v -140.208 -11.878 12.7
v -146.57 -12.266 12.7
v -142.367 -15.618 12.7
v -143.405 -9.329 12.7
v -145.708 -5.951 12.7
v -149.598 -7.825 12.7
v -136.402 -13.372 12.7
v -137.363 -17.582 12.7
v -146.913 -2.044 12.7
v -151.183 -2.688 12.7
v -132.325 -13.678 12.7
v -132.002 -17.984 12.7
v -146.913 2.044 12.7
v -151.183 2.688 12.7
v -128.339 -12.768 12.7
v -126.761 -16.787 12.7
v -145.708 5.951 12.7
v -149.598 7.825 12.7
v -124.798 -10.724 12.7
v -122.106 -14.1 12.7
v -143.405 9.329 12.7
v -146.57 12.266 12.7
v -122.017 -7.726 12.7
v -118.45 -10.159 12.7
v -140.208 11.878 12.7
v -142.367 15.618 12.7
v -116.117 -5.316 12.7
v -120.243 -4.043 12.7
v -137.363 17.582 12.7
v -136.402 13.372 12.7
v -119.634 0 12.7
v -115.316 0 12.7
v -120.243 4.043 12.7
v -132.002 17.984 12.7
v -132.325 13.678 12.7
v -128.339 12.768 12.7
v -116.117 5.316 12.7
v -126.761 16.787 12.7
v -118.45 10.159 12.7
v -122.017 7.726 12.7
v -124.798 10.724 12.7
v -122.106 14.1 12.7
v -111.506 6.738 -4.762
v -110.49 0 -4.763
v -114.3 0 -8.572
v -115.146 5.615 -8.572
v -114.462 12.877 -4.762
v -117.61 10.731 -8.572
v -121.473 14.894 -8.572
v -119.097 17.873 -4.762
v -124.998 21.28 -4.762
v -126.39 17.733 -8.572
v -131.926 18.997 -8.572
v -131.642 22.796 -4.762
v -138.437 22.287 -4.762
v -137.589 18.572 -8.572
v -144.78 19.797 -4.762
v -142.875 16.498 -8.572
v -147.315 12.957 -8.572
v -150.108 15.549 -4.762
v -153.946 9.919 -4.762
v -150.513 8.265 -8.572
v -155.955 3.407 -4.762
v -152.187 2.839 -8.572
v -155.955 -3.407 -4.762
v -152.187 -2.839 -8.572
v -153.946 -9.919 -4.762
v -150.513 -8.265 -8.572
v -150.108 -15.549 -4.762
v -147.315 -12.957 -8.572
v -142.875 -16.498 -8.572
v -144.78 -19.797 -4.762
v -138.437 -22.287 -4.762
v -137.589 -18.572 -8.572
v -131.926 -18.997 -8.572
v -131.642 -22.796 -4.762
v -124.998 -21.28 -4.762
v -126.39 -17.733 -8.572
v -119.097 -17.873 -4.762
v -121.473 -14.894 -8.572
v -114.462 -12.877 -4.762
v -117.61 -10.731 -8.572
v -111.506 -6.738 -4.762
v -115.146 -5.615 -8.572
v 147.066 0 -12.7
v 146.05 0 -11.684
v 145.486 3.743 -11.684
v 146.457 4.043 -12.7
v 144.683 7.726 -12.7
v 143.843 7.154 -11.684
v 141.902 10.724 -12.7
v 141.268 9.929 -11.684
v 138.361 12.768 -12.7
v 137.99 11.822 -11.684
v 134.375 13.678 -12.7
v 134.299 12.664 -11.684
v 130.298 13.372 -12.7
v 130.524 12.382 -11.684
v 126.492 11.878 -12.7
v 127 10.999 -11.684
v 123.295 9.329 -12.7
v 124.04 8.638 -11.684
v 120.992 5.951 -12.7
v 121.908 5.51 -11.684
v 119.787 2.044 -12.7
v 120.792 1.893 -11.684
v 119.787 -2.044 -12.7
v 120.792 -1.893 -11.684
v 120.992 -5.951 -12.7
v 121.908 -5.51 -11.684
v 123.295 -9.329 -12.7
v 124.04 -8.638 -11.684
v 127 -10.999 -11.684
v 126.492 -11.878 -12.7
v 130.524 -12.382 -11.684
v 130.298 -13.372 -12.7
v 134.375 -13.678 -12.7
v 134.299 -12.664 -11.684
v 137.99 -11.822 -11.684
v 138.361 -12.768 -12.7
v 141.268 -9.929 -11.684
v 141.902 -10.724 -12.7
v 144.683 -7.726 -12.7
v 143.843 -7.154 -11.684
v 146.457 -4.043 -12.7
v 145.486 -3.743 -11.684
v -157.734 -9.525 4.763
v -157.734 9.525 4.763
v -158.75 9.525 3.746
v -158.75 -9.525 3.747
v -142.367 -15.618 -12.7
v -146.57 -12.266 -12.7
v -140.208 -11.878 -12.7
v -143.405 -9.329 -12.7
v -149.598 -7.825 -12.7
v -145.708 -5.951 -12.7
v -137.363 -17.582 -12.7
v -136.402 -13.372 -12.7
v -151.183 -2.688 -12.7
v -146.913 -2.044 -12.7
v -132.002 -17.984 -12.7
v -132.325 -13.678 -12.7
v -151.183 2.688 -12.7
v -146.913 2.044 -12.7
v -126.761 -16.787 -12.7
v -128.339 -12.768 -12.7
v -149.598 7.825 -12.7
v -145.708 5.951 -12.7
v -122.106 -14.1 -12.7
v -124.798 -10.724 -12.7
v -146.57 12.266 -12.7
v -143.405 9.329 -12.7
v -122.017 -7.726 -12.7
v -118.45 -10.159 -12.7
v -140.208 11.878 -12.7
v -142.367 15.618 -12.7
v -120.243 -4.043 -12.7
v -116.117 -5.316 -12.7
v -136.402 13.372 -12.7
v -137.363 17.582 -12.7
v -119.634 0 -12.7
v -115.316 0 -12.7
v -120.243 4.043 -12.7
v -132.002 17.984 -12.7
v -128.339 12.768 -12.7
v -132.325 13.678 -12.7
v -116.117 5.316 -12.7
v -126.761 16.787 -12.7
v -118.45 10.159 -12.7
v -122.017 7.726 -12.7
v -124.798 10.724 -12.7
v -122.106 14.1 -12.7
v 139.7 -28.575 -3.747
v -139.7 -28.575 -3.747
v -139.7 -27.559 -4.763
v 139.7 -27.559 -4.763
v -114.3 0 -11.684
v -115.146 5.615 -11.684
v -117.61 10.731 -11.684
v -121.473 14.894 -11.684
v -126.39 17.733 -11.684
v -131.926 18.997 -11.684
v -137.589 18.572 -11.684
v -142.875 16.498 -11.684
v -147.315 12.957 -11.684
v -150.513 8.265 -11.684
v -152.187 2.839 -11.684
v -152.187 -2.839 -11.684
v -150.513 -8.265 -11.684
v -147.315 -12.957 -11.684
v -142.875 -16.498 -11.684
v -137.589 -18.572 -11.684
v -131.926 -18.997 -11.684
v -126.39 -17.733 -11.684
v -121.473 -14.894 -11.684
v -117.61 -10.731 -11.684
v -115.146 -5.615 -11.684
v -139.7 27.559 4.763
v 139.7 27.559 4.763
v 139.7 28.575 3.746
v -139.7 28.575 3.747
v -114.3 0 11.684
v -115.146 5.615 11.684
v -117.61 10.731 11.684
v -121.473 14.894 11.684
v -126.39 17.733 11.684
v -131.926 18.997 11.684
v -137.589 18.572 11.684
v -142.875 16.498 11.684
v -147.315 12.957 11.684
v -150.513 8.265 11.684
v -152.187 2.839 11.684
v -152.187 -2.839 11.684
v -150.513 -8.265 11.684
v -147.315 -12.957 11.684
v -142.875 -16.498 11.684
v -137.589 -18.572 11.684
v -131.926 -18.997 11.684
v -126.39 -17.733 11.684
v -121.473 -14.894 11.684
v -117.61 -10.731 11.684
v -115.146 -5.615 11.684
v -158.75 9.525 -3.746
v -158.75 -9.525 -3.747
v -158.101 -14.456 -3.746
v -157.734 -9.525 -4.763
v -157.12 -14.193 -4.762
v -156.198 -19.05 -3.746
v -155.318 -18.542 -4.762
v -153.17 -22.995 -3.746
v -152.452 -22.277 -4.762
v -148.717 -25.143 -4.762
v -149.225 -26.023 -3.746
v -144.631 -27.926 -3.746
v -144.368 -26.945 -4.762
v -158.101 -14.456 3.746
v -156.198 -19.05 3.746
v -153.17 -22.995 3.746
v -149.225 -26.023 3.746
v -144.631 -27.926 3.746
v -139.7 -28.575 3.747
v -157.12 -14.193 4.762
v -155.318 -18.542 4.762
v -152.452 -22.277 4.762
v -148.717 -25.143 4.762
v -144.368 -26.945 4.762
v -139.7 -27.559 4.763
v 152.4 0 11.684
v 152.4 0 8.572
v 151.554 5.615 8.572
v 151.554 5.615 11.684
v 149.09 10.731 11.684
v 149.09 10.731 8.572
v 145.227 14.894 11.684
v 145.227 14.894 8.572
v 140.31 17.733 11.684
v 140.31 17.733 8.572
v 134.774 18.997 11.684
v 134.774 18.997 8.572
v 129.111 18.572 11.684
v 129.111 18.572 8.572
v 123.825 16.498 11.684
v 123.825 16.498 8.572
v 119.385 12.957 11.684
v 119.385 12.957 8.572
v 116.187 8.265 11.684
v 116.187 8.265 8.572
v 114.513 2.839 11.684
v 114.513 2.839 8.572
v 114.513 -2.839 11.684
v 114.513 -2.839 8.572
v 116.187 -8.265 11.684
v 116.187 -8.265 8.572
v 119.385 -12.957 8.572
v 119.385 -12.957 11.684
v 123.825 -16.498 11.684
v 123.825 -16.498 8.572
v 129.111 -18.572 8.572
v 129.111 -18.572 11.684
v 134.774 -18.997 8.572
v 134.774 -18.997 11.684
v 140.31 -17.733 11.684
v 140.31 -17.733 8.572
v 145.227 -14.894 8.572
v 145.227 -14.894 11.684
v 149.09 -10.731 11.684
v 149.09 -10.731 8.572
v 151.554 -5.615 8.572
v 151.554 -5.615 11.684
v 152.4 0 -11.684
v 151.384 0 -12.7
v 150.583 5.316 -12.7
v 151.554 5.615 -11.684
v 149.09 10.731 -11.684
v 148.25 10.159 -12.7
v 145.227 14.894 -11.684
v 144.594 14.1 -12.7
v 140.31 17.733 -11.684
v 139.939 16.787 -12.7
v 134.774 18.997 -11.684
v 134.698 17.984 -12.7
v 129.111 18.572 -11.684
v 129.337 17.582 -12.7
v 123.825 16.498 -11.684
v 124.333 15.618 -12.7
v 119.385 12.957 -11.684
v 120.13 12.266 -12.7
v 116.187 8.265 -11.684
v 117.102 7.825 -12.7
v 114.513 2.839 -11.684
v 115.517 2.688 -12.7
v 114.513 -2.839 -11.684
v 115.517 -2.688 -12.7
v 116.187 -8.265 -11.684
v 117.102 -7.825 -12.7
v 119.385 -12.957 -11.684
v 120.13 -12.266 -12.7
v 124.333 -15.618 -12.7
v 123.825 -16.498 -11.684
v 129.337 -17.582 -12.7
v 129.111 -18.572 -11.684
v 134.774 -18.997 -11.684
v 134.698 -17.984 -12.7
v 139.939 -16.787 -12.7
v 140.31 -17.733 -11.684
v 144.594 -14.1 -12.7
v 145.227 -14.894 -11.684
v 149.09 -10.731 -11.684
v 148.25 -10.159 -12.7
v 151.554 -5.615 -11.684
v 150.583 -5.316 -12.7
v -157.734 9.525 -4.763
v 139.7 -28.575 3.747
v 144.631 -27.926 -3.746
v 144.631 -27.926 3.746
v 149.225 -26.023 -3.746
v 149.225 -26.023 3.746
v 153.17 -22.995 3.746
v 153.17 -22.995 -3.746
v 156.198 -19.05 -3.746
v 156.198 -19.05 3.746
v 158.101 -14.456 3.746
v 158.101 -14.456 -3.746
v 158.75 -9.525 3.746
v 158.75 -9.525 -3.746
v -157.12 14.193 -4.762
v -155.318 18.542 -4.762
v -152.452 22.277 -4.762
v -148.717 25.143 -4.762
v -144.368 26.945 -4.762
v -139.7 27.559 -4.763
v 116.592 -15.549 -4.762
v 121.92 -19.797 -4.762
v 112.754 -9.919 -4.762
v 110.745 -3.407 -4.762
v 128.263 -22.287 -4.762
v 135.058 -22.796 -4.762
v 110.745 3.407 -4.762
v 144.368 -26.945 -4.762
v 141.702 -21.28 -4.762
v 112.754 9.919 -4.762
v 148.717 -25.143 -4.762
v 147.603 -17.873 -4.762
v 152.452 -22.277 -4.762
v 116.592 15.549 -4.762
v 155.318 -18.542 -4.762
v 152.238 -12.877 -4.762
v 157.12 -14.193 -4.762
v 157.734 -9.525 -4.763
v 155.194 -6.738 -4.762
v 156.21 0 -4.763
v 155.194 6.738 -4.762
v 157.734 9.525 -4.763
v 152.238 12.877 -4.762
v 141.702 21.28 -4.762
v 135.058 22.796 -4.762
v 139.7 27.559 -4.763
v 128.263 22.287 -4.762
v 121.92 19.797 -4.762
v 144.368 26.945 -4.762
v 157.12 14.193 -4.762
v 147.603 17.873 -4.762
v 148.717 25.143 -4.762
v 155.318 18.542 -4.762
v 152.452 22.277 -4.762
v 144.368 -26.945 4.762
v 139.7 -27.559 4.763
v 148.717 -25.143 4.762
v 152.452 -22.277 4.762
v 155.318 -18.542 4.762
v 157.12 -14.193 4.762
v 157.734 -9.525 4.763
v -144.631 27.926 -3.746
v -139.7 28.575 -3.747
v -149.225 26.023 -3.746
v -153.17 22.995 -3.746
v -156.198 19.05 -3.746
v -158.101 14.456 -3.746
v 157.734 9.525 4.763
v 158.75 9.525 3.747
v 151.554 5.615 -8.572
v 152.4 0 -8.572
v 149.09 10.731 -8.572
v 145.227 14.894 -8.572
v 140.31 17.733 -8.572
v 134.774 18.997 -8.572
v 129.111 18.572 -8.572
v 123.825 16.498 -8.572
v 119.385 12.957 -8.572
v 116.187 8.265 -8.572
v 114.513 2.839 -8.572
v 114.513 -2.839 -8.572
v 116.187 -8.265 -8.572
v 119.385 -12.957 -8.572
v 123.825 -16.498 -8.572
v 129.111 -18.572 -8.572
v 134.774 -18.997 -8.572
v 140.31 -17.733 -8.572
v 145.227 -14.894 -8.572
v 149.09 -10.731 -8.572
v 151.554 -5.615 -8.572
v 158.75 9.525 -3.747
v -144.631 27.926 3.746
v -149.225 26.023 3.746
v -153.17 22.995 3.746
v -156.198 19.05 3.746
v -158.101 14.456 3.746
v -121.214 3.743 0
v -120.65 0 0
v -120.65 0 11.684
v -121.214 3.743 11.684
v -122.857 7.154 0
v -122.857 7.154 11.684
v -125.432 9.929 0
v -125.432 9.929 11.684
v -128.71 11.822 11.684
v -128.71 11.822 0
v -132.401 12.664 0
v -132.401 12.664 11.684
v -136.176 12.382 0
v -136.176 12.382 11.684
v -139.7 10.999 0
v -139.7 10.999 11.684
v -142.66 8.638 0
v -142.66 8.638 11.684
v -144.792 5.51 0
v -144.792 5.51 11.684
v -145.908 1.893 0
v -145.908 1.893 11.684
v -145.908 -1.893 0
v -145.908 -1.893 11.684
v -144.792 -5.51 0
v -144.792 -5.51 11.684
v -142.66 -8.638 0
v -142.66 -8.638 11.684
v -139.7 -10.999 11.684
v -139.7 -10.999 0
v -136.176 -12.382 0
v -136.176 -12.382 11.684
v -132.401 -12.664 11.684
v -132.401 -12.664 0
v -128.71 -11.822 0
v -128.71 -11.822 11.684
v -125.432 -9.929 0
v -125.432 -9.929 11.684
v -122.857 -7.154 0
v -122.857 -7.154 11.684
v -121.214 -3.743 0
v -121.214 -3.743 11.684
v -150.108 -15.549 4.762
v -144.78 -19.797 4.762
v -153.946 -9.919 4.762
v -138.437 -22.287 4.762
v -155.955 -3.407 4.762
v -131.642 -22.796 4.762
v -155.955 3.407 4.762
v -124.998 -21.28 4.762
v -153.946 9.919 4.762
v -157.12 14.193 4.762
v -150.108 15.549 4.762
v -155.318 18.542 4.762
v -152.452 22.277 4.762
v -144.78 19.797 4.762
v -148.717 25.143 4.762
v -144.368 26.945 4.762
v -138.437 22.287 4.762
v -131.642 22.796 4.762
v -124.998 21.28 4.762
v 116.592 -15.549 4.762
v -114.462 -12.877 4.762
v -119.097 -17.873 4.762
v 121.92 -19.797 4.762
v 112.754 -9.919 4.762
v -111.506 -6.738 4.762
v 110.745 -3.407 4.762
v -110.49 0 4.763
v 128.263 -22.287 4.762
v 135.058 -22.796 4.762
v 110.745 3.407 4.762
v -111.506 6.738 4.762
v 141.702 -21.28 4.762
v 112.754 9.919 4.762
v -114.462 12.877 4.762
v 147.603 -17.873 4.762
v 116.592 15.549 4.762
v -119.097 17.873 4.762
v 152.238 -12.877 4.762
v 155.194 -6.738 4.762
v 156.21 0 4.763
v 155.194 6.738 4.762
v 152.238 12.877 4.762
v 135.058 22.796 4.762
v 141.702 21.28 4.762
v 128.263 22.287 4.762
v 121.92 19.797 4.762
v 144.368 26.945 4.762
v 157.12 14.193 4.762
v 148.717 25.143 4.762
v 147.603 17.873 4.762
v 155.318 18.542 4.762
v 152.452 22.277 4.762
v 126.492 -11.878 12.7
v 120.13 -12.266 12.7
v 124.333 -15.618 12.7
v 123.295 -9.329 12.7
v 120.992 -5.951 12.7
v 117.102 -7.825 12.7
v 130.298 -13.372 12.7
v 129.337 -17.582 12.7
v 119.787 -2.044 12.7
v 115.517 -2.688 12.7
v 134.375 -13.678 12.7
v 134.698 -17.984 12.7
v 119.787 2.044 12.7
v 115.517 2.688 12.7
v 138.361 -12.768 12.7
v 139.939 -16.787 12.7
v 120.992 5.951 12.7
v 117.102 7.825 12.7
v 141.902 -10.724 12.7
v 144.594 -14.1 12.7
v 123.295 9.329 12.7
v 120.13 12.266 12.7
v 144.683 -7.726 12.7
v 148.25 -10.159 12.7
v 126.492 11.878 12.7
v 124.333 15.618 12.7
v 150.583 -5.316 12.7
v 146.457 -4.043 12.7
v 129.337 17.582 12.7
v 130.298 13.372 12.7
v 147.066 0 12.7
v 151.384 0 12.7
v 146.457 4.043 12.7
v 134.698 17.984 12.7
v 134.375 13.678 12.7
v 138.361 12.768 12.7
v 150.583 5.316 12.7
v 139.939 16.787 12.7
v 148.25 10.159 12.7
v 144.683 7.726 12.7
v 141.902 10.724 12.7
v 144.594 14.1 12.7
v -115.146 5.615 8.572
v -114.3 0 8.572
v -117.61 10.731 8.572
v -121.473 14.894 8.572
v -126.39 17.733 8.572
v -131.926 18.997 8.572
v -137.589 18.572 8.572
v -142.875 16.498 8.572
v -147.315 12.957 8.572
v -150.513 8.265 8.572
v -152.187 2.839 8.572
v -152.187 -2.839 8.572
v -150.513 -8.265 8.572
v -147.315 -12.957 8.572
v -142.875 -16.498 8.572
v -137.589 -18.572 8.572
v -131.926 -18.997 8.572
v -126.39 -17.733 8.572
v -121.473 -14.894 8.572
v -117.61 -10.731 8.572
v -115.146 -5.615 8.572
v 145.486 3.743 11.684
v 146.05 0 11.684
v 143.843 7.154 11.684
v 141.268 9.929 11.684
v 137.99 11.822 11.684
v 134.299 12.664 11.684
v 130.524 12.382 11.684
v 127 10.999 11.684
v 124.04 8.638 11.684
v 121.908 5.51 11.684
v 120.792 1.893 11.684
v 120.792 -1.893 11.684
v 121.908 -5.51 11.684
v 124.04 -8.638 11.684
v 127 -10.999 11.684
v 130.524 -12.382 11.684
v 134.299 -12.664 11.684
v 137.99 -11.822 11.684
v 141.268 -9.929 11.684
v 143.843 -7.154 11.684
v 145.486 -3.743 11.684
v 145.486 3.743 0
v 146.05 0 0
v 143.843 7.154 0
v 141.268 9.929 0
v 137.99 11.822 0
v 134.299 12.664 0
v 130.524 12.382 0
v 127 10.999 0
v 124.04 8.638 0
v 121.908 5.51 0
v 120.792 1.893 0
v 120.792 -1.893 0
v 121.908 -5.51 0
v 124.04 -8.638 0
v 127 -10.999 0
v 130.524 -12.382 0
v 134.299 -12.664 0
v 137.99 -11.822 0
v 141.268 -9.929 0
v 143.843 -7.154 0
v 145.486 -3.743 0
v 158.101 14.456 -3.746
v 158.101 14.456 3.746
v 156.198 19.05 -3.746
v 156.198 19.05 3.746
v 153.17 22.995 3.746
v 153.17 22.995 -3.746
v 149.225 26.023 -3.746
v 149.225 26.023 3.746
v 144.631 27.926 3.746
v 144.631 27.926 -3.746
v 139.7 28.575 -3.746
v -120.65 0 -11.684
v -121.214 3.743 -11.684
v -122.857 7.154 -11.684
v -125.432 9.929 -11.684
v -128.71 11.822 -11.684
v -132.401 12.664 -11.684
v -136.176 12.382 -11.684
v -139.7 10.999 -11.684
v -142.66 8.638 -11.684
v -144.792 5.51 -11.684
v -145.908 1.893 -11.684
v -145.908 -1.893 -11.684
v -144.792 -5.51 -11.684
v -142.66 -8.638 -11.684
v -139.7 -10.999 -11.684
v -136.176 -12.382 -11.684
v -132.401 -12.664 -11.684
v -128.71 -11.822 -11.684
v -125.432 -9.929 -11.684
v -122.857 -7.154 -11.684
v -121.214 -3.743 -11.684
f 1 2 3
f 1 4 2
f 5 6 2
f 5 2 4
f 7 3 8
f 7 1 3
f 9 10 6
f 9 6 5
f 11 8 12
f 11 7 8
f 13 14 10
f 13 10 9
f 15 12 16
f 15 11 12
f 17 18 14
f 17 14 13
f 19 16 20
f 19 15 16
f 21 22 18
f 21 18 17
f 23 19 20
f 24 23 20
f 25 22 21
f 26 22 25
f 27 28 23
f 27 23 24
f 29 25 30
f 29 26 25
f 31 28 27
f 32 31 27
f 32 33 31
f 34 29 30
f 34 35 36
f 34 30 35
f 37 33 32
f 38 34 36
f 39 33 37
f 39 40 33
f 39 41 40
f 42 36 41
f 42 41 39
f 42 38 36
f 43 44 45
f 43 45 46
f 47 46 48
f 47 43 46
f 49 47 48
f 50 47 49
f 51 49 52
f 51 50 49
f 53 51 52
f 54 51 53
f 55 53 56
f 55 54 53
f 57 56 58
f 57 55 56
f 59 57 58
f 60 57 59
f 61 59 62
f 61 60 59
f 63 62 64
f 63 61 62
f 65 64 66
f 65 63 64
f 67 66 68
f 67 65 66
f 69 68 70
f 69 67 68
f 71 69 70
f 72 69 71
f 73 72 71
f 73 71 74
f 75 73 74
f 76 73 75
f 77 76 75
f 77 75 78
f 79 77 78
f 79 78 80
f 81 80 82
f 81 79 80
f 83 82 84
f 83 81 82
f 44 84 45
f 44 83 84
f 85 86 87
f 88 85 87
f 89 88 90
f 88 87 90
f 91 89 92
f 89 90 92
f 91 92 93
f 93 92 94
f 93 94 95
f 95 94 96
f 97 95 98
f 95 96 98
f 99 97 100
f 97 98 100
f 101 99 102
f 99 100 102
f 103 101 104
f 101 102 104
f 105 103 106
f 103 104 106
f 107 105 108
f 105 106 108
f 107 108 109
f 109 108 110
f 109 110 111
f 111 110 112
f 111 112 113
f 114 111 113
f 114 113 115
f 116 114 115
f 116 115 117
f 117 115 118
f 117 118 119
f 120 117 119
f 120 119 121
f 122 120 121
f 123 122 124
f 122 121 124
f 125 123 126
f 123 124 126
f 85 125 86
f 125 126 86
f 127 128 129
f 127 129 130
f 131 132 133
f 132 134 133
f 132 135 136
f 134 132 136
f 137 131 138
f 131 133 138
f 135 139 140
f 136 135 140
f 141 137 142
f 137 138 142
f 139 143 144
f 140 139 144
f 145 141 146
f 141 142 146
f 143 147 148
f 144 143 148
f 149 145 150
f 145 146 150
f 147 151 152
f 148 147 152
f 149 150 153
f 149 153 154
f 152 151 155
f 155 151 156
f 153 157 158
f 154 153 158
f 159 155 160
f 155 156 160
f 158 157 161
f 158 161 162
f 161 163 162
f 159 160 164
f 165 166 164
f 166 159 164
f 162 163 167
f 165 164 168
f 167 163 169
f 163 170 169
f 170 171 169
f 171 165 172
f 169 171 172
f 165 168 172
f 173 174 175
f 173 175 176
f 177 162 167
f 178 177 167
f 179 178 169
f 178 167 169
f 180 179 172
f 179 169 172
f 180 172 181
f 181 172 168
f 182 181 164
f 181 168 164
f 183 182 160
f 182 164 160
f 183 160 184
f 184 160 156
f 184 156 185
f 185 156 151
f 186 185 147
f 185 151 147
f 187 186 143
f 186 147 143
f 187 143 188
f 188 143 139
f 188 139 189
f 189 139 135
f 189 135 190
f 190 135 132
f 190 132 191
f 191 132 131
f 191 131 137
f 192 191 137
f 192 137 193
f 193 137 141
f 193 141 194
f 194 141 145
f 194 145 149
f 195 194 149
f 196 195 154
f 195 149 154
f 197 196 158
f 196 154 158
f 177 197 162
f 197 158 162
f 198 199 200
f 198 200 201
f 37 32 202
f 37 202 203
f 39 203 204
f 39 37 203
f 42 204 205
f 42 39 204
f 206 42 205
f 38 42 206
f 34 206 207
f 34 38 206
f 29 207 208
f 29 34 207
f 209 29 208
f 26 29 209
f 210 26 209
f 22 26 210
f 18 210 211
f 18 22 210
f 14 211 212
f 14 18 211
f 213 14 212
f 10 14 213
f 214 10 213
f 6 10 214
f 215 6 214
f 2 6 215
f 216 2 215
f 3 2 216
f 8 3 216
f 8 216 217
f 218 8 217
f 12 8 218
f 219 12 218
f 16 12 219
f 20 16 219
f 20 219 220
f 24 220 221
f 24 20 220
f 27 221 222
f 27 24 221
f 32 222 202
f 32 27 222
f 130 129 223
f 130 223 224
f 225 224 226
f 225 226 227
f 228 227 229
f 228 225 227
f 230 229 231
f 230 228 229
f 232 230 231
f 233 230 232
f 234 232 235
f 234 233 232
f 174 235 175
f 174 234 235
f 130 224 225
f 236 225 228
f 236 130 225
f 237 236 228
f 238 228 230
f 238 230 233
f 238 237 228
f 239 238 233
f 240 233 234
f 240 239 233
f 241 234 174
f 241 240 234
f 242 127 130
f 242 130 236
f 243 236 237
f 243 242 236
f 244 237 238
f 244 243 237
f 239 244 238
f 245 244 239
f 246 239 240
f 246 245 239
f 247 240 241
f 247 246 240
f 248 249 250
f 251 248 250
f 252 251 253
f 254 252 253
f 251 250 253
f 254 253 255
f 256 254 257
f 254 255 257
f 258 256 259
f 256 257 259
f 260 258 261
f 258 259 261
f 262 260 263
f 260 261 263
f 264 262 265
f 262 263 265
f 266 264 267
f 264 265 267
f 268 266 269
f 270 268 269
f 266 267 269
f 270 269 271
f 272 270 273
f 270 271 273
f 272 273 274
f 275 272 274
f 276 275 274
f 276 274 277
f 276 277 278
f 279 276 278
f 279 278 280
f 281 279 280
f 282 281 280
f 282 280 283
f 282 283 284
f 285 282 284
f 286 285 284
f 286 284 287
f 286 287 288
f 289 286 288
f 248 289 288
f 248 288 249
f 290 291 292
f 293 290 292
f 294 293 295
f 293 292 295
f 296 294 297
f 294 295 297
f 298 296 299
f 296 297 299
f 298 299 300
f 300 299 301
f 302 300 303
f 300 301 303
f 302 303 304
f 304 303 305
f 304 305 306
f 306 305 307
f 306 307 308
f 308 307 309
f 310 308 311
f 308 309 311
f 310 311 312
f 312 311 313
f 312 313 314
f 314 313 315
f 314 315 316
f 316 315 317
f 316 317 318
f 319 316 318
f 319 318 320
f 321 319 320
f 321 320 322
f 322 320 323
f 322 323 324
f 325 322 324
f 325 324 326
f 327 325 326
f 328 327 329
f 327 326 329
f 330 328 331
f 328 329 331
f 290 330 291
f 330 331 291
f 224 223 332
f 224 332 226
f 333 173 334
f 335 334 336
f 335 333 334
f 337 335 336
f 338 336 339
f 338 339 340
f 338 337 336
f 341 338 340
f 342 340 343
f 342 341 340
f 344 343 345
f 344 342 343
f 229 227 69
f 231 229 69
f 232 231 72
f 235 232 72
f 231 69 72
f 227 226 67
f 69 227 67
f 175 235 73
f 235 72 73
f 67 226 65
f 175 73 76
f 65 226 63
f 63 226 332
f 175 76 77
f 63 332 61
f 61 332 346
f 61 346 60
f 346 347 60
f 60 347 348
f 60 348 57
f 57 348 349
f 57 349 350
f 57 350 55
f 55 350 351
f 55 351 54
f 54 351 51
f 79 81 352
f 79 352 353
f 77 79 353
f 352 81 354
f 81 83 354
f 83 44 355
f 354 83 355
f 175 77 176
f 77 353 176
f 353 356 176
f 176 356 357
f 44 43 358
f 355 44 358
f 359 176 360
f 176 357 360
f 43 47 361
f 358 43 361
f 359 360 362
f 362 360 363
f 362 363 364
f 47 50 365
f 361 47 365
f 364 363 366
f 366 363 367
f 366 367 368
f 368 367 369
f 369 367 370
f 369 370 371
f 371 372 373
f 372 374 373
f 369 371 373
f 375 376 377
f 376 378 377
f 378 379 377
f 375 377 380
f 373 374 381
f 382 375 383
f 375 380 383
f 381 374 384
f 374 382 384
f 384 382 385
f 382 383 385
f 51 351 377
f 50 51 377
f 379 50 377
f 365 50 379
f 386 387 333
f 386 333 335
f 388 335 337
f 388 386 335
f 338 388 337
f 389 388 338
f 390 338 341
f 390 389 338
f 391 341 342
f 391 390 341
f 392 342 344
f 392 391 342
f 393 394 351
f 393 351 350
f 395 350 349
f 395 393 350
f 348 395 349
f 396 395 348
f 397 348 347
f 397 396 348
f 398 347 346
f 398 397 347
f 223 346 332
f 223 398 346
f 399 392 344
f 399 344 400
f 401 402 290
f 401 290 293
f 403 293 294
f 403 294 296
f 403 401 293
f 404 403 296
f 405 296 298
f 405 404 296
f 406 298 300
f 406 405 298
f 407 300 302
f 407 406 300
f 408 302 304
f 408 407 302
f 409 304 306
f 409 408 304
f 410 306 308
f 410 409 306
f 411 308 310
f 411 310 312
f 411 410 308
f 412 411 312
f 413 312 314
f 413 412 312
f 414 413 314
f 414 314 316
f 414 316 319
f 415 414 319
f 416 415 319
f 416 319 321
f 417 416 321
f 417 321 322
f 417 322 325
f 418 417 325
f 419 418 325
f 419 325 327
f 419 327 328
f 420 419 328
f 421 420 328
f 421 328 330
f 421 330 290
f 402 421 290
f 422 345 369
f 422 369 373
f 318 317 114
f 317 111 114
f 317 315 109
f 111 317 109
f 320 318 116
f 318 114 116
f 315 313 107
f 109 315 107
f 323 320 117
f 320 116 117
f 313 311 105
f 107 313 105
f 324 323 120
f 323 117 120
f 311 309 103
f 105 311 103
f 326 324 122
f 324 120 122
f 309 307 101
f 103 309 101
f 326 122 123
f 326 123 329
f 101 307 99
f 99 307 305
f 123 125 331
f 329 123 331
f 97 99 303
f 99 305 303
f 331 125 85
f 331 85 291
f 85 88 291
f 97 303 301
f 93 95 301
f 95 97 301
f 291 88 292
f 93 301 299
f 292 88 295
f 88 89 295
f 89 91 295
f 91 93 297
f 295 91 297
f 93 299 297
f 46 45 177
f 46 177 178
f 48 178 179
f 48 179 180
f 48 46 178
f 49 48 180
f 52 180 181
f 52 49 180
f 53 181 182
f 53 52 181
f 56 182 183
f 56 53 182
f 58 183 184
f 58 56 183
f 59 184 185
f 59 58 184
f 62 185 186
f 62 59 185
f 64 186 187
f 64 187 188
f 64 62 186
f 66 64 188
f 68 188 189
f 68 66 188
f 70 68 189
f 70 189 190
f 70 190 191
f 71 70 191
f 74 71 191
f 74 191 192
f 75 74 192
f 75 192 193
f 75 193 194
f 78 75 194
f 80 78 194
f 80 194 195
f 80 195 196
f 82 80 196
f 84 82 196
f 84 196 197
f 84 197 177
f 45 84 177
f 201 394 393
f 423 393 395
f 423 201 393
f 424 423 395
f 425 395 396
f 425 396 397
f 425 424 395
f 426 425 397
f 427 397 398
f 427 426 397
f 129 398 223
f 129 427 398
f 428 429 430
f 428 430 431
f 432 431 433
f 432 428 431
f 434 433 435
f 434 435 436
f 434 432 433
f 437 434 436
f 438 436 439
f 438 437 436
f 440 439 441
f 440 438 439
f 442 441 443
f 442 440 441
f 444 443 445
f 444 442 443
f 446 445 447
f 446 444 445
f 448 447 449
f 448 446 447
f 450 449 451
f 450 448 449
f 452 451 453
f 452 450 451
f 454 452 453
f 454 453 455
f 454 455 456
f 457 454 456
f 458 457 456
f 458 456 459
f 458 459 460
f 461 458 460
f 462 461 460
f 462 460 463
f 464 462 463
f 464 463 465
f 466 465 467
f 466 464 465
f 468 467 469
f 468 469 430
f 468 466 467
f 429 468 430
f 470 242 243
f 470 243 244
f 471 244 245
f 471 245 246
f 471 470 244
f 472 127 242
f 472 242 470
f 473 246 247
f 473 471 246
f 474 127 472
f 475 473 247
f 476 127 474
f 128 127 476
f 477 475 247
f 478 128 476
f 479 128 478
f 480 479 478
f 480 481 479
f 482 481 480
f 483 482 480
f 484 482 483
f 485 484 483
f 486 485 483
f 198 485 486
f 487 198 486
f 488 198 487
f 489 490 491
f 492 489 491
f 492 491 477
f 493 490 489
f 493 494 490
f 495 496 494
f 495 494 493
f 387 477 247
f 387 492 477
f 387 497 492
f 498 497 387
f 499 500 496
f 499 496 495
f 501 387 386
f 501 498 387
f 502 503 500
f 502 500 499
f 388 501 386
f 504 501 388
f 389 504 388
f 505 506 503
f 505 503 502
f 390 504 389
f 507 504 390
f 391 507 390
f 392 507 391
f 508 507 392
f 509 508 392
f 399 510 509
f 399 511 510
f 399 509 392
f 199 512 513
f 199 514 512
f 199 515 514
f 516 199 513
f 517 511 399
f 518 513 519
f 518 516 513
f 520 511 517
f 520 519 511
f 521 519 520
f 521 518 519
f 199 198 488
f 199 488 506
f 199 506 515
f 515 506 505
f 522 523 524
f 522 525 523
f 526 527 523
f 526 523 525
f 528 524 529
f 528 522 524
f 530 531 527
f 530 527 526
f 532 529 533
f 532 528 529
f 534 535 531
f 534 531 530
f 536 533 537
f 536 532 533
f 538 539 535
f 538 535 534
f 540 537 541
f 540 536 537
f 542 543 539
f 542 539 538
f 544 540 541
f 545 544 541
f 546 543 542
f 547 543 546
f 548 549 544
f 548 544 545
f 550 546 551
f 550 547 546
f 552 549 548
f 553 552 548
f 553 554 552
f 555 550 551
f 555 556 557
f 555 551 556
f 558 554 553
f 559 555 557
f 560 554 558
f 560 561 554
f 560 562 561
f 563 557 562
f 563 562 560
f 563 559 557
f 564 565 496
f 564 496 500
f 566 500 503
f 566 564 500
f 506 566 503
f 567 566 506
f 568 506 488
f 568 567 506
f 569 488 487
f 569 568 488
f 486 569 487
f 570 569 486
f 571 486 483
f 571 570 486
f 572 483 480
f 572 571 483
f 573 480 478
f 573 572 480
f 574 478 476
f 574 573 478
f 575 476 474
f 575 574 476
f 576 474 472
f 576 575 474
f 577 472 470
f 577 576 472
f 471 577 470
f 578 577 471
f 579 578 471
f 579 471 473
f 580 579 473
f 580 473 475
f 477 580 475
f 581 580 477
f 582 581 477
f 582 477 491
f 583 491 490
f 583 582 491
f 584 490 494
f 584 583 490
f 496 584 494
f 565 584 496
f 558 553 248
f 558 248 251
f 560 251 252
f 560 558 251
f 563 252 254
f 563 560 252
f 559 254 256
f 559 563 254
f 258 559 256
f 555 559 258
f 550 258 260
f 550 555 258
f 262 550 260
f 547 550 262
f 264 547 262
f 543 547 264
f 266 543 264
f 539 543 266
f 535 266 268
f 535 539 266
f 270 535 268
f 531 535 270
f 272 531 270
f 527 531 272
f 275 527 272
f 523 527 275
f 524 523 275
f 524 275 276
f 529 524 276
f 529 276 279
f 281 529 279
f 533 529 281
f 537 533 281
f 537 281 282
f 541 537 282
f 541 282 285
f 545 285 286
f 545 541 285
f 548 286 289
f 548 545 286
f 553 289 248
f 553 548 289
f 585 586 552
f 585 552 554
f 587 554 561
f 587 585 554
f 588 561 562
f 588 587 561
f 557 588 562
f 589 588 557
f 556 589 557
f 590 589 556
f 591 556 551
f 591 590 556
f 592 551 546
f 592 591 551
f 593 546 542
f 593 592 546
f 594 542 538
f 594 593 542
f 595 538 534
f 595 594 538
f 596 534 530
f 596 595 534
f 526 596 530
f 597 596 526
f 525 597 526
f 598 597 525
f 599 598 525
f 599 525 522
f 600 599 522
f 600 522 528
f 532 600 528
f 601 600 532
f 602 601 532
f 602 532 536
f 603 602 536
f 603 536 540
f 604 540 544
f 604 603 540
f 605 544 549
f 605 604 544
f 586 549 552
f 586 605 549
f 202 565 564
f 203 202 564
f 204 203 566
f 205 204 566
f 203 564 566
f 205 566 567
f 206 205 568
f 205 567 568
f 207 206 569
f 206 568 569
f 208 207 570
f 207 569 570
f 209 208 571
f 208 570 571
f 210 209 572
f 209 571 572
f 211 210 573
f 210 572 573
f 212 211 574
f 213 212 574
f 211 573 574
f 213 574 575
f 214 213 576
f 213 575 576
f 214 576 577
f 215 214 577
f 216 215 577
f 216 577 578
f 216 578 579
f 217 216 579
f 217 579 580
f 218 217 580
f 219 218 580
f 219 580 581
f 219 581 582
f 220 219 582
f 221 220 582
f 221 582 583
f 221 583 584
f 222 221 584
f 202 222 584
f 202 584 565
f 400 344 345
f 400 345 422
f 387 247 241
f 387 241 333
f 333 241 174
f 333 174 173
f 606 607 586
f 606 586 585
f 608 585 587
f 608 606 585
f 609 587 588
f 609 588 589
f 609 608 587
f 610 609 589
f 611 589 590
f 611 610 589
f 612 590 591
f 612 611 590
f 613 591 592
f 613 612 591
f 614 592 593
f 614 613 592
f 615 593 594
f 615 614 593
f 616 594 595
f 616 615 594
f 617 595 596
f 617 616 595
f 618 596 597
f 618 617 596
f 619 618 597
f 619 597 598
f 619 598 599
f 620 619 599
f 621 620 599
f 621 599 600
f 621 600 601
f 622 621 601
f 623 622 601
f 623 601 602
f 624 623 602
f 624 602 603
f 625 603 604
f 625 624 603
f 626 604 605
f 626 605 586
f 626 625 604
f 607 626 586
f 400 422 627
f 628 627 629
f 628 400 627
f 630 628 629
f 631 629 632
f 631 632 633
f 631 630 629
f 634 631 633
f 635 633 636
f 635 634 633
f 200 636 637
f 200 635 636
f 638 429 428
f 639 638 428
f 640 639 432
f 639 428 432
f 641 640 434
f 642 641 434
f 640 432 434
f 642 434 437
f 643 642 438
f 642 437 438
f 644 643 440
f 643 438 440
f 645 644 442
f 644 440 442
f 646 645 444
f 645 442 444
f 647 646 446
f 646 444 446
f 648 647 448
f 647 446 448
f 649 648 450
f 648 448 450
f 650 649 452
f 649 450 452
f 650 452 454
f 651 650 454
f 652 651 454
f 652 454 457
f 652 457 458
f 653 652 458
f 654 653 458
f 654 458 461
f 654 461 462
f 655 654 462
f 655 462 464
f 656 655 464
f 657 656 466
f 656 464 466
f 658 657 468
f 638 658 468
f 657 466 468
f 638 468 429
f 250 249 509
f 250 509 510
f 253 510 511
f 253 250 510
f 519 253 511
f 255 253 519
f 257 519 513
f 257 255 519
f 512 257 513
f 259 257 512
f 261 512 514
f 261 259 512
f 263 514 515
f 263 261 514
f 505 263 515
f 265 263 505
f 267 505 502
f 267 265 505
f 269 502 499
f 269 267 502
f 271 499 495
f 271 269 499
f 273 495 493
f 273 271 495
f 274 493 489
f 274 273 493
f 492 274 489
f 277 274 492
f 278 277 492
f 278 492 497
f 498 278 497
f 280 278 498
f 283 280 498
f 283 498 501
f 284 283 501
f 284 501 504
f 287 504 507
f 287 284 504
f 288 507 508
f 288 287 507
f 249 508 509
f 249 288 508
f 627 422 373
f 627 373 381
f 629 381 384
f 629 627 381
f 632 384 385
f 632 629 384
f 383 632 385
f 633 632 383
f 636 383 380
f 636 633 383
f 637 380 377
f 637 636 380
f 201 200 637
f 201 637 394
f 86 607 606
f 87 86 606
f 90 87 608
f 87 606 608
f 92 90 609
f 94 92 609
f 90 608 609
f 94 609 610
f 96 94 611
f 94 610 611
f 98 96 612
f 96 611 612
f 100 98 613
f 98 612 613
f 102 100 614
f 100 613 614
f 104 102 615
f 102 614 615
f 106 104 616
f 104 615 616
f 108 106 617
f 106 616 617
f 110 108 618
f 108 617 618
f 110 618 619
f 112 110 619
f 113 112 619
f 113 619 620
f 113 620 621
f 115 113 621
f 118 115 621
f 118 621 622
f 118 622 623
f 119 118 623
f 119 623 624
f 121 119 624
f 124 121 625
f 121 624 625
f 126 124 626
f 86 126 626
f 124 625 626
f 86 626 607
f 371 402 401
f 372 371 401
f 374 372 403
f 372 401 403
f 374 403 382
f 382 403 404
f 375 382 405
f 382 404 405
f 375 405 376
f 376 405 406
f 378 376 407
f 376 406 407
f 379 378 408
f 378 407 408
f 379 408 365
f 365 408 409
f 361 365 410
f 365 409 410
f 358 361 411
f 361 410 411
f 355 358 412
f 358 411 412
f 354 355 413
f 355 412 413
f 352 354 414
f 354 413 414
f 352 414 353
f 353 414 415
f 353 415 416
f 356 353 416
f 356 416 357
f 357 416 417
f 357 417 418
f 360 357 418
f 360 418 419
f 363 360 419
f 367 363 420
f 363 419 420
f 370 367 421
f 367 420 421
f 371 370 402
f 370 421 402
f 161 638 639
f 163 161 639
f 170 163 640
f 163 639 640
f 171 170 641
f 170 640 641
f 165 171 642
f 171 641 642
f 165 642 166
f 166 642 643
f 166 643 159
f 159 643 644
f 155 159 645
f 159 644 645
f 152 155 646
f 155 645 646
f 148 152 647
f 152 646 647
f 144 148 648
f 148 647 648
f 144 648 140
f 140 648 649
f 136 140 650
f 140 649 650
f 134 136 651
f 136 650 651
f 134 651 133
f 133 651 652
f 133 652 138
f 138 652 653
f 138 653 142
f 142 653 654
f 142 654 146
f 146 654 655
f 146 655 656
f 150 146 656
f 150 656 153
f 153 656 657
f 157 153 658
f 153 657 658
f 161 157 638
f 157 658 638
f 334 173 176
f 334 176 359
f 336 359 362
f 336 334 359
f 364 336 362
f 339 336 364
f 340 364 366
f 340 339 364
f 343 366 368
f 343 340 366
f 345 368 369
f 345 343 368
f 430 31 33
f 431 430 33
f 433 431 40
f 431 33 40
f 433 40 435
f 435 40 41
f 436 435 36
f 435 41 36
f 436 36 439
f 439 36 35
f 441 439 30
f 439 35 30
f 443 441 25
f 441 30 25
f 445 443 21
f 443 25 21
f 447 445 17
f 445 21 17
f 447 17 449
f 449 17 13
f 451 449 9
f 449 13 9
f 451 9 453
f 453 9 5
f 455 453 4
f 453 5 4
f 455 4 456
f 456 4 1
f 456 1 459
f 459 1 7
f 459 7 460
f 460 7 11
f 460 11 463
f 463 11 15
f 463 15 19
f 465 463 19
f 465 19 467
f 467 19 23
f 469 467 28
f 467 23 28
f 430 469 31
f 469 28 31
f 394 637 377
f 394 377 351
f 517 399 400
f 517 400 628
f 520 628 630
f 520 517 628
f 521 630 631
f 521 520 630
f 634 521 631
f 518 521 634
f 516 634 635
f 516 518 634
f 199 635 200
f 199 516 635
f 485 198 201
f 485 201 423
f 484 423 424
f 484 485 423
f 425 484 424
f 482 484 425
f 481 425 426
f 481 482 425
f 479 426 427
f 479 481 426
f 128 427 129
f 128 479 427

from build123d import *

# Parameters (mm, degrees)
F0_R          = 19.05
F1_DEPTH      = 4.7625
F1_DEPTH_BACK = 4.7625
F0_R_2        = 12.7
F2_DEPTH      = 12.7
F2_DEPTH_BACK = 12.7
F3_SIZE       = 1.016
F4_SIZE       = 3.81


with BuildPart() as f1:
    # F0 (on Top) → F1 (new body, two sides)
    with BuildSketch(Plane.XY) as f1_sk:
        with BuildLine():
            Line((-139.7, -28.575), (139.7, -28.575))
            ThreePointArc((139.7, -28.575), (153.170384, -22.995384), (158.75, -9.525))
            Line((158.75, -9.525), (158.75, 9.525))
            ThreePointArc((158.75, 9.525), (153.170384, 22.995384), (139.7, 28.575))
            Line((139.7, 28.575), (-139.7, 28.575))
            ThreePointArc((-139.7, 28.575), (-153.170384, 22.995384), (-158.75, 9.525))
            Line((-158.75, 9.525), (-158.75, -9.525))
            ThreePointArc((-158.75, -9.525), (-153.170384, -22.995384), (-139.7, -28.575))
        make_face()
        with Locations((-133.35, 0)):
            Circle(F0_R, mode=Mode.SUBTRACT)
        with Locations((133.35, 0)):
            Circle(F0_R, mode=Mode.SUBTRACT)
    extrude(amount=F1_DEPTH)
    extrude(f1_sk.sketch, amount=-F1_DEPTH_BACK)

    # F0 (on Top) → F2 (join, two sides)
    with BuildSketch(Plane.XY) as f2_sk:
        with Locations((-133.35, 0)):
            Circle(F0_R)
        with Locations((-133.35, 0)):
            Circle(F0_R_2, mode=Mode.SUBTRACT)
        with Locations((133.35, 0)):
            Circle(F0_R)
        with Locations((133.35, 0)):
            Circle(F0_R_2, mode=Mode.SUBTRACT)
    extrude(amount=F2_DEPTH)
    extrude(f2_sk.sketch, amount=-F2_DEPTH_BACK)

    # F3
    f3_edges = [f1.edges().sort_by_distance(p)[0] for p in [
        (-139.7, -28.575, 0),
        (0, -28.575, 4.7625),
        (139.7, -28.575, 0),
        (0, -28.575, -4.7625),
        (158.75, 0, 4.7625),
        (158.75, 9.525, 0),
        (158.75, 0, -4.7625),
        (158.75, -9.525, 0),
        (0, 28.575, 4.7625),
        (-139.7, 28.575, 0),
        (0, 28.575, -4.7625),
        (139.7, 28.575, 0),
        (-158.75, 9.525, 0),
        (-158.75, 0, 4.7625),
        (-158.75, -9.525, 0),
        (-158.75, 0, -4.7625),
        (120.65, 0, 12.7),
        (146.05, 0, 0),
        (120.65, 0, -12.7),
        (-146.05, 0, 12.7),
        (-120.65, 0, 0),
        (-146.05, 0, -12.7),
        (-152.4, 0, -12.7),
        (114.3, 0, -12.7),
        (114.3, 0, 12.7),
        (-152.4, 0, 12.7),
    ]]
    chamfer(f3_edges, length=F3_SIZE)

    # F4
    f4_edges = [f1.edges().sort_by_distance(p)[0] for p in [
        (-152.4, 0, 4.7625),
        (-152.4, 0, -4.7625),
        (114.3, 0, -4.7625),
        (114.3, 0, 4.7625),
    ]]
    chamfer(f4_edges, length=F4_SIZE)


solid = f1.part
